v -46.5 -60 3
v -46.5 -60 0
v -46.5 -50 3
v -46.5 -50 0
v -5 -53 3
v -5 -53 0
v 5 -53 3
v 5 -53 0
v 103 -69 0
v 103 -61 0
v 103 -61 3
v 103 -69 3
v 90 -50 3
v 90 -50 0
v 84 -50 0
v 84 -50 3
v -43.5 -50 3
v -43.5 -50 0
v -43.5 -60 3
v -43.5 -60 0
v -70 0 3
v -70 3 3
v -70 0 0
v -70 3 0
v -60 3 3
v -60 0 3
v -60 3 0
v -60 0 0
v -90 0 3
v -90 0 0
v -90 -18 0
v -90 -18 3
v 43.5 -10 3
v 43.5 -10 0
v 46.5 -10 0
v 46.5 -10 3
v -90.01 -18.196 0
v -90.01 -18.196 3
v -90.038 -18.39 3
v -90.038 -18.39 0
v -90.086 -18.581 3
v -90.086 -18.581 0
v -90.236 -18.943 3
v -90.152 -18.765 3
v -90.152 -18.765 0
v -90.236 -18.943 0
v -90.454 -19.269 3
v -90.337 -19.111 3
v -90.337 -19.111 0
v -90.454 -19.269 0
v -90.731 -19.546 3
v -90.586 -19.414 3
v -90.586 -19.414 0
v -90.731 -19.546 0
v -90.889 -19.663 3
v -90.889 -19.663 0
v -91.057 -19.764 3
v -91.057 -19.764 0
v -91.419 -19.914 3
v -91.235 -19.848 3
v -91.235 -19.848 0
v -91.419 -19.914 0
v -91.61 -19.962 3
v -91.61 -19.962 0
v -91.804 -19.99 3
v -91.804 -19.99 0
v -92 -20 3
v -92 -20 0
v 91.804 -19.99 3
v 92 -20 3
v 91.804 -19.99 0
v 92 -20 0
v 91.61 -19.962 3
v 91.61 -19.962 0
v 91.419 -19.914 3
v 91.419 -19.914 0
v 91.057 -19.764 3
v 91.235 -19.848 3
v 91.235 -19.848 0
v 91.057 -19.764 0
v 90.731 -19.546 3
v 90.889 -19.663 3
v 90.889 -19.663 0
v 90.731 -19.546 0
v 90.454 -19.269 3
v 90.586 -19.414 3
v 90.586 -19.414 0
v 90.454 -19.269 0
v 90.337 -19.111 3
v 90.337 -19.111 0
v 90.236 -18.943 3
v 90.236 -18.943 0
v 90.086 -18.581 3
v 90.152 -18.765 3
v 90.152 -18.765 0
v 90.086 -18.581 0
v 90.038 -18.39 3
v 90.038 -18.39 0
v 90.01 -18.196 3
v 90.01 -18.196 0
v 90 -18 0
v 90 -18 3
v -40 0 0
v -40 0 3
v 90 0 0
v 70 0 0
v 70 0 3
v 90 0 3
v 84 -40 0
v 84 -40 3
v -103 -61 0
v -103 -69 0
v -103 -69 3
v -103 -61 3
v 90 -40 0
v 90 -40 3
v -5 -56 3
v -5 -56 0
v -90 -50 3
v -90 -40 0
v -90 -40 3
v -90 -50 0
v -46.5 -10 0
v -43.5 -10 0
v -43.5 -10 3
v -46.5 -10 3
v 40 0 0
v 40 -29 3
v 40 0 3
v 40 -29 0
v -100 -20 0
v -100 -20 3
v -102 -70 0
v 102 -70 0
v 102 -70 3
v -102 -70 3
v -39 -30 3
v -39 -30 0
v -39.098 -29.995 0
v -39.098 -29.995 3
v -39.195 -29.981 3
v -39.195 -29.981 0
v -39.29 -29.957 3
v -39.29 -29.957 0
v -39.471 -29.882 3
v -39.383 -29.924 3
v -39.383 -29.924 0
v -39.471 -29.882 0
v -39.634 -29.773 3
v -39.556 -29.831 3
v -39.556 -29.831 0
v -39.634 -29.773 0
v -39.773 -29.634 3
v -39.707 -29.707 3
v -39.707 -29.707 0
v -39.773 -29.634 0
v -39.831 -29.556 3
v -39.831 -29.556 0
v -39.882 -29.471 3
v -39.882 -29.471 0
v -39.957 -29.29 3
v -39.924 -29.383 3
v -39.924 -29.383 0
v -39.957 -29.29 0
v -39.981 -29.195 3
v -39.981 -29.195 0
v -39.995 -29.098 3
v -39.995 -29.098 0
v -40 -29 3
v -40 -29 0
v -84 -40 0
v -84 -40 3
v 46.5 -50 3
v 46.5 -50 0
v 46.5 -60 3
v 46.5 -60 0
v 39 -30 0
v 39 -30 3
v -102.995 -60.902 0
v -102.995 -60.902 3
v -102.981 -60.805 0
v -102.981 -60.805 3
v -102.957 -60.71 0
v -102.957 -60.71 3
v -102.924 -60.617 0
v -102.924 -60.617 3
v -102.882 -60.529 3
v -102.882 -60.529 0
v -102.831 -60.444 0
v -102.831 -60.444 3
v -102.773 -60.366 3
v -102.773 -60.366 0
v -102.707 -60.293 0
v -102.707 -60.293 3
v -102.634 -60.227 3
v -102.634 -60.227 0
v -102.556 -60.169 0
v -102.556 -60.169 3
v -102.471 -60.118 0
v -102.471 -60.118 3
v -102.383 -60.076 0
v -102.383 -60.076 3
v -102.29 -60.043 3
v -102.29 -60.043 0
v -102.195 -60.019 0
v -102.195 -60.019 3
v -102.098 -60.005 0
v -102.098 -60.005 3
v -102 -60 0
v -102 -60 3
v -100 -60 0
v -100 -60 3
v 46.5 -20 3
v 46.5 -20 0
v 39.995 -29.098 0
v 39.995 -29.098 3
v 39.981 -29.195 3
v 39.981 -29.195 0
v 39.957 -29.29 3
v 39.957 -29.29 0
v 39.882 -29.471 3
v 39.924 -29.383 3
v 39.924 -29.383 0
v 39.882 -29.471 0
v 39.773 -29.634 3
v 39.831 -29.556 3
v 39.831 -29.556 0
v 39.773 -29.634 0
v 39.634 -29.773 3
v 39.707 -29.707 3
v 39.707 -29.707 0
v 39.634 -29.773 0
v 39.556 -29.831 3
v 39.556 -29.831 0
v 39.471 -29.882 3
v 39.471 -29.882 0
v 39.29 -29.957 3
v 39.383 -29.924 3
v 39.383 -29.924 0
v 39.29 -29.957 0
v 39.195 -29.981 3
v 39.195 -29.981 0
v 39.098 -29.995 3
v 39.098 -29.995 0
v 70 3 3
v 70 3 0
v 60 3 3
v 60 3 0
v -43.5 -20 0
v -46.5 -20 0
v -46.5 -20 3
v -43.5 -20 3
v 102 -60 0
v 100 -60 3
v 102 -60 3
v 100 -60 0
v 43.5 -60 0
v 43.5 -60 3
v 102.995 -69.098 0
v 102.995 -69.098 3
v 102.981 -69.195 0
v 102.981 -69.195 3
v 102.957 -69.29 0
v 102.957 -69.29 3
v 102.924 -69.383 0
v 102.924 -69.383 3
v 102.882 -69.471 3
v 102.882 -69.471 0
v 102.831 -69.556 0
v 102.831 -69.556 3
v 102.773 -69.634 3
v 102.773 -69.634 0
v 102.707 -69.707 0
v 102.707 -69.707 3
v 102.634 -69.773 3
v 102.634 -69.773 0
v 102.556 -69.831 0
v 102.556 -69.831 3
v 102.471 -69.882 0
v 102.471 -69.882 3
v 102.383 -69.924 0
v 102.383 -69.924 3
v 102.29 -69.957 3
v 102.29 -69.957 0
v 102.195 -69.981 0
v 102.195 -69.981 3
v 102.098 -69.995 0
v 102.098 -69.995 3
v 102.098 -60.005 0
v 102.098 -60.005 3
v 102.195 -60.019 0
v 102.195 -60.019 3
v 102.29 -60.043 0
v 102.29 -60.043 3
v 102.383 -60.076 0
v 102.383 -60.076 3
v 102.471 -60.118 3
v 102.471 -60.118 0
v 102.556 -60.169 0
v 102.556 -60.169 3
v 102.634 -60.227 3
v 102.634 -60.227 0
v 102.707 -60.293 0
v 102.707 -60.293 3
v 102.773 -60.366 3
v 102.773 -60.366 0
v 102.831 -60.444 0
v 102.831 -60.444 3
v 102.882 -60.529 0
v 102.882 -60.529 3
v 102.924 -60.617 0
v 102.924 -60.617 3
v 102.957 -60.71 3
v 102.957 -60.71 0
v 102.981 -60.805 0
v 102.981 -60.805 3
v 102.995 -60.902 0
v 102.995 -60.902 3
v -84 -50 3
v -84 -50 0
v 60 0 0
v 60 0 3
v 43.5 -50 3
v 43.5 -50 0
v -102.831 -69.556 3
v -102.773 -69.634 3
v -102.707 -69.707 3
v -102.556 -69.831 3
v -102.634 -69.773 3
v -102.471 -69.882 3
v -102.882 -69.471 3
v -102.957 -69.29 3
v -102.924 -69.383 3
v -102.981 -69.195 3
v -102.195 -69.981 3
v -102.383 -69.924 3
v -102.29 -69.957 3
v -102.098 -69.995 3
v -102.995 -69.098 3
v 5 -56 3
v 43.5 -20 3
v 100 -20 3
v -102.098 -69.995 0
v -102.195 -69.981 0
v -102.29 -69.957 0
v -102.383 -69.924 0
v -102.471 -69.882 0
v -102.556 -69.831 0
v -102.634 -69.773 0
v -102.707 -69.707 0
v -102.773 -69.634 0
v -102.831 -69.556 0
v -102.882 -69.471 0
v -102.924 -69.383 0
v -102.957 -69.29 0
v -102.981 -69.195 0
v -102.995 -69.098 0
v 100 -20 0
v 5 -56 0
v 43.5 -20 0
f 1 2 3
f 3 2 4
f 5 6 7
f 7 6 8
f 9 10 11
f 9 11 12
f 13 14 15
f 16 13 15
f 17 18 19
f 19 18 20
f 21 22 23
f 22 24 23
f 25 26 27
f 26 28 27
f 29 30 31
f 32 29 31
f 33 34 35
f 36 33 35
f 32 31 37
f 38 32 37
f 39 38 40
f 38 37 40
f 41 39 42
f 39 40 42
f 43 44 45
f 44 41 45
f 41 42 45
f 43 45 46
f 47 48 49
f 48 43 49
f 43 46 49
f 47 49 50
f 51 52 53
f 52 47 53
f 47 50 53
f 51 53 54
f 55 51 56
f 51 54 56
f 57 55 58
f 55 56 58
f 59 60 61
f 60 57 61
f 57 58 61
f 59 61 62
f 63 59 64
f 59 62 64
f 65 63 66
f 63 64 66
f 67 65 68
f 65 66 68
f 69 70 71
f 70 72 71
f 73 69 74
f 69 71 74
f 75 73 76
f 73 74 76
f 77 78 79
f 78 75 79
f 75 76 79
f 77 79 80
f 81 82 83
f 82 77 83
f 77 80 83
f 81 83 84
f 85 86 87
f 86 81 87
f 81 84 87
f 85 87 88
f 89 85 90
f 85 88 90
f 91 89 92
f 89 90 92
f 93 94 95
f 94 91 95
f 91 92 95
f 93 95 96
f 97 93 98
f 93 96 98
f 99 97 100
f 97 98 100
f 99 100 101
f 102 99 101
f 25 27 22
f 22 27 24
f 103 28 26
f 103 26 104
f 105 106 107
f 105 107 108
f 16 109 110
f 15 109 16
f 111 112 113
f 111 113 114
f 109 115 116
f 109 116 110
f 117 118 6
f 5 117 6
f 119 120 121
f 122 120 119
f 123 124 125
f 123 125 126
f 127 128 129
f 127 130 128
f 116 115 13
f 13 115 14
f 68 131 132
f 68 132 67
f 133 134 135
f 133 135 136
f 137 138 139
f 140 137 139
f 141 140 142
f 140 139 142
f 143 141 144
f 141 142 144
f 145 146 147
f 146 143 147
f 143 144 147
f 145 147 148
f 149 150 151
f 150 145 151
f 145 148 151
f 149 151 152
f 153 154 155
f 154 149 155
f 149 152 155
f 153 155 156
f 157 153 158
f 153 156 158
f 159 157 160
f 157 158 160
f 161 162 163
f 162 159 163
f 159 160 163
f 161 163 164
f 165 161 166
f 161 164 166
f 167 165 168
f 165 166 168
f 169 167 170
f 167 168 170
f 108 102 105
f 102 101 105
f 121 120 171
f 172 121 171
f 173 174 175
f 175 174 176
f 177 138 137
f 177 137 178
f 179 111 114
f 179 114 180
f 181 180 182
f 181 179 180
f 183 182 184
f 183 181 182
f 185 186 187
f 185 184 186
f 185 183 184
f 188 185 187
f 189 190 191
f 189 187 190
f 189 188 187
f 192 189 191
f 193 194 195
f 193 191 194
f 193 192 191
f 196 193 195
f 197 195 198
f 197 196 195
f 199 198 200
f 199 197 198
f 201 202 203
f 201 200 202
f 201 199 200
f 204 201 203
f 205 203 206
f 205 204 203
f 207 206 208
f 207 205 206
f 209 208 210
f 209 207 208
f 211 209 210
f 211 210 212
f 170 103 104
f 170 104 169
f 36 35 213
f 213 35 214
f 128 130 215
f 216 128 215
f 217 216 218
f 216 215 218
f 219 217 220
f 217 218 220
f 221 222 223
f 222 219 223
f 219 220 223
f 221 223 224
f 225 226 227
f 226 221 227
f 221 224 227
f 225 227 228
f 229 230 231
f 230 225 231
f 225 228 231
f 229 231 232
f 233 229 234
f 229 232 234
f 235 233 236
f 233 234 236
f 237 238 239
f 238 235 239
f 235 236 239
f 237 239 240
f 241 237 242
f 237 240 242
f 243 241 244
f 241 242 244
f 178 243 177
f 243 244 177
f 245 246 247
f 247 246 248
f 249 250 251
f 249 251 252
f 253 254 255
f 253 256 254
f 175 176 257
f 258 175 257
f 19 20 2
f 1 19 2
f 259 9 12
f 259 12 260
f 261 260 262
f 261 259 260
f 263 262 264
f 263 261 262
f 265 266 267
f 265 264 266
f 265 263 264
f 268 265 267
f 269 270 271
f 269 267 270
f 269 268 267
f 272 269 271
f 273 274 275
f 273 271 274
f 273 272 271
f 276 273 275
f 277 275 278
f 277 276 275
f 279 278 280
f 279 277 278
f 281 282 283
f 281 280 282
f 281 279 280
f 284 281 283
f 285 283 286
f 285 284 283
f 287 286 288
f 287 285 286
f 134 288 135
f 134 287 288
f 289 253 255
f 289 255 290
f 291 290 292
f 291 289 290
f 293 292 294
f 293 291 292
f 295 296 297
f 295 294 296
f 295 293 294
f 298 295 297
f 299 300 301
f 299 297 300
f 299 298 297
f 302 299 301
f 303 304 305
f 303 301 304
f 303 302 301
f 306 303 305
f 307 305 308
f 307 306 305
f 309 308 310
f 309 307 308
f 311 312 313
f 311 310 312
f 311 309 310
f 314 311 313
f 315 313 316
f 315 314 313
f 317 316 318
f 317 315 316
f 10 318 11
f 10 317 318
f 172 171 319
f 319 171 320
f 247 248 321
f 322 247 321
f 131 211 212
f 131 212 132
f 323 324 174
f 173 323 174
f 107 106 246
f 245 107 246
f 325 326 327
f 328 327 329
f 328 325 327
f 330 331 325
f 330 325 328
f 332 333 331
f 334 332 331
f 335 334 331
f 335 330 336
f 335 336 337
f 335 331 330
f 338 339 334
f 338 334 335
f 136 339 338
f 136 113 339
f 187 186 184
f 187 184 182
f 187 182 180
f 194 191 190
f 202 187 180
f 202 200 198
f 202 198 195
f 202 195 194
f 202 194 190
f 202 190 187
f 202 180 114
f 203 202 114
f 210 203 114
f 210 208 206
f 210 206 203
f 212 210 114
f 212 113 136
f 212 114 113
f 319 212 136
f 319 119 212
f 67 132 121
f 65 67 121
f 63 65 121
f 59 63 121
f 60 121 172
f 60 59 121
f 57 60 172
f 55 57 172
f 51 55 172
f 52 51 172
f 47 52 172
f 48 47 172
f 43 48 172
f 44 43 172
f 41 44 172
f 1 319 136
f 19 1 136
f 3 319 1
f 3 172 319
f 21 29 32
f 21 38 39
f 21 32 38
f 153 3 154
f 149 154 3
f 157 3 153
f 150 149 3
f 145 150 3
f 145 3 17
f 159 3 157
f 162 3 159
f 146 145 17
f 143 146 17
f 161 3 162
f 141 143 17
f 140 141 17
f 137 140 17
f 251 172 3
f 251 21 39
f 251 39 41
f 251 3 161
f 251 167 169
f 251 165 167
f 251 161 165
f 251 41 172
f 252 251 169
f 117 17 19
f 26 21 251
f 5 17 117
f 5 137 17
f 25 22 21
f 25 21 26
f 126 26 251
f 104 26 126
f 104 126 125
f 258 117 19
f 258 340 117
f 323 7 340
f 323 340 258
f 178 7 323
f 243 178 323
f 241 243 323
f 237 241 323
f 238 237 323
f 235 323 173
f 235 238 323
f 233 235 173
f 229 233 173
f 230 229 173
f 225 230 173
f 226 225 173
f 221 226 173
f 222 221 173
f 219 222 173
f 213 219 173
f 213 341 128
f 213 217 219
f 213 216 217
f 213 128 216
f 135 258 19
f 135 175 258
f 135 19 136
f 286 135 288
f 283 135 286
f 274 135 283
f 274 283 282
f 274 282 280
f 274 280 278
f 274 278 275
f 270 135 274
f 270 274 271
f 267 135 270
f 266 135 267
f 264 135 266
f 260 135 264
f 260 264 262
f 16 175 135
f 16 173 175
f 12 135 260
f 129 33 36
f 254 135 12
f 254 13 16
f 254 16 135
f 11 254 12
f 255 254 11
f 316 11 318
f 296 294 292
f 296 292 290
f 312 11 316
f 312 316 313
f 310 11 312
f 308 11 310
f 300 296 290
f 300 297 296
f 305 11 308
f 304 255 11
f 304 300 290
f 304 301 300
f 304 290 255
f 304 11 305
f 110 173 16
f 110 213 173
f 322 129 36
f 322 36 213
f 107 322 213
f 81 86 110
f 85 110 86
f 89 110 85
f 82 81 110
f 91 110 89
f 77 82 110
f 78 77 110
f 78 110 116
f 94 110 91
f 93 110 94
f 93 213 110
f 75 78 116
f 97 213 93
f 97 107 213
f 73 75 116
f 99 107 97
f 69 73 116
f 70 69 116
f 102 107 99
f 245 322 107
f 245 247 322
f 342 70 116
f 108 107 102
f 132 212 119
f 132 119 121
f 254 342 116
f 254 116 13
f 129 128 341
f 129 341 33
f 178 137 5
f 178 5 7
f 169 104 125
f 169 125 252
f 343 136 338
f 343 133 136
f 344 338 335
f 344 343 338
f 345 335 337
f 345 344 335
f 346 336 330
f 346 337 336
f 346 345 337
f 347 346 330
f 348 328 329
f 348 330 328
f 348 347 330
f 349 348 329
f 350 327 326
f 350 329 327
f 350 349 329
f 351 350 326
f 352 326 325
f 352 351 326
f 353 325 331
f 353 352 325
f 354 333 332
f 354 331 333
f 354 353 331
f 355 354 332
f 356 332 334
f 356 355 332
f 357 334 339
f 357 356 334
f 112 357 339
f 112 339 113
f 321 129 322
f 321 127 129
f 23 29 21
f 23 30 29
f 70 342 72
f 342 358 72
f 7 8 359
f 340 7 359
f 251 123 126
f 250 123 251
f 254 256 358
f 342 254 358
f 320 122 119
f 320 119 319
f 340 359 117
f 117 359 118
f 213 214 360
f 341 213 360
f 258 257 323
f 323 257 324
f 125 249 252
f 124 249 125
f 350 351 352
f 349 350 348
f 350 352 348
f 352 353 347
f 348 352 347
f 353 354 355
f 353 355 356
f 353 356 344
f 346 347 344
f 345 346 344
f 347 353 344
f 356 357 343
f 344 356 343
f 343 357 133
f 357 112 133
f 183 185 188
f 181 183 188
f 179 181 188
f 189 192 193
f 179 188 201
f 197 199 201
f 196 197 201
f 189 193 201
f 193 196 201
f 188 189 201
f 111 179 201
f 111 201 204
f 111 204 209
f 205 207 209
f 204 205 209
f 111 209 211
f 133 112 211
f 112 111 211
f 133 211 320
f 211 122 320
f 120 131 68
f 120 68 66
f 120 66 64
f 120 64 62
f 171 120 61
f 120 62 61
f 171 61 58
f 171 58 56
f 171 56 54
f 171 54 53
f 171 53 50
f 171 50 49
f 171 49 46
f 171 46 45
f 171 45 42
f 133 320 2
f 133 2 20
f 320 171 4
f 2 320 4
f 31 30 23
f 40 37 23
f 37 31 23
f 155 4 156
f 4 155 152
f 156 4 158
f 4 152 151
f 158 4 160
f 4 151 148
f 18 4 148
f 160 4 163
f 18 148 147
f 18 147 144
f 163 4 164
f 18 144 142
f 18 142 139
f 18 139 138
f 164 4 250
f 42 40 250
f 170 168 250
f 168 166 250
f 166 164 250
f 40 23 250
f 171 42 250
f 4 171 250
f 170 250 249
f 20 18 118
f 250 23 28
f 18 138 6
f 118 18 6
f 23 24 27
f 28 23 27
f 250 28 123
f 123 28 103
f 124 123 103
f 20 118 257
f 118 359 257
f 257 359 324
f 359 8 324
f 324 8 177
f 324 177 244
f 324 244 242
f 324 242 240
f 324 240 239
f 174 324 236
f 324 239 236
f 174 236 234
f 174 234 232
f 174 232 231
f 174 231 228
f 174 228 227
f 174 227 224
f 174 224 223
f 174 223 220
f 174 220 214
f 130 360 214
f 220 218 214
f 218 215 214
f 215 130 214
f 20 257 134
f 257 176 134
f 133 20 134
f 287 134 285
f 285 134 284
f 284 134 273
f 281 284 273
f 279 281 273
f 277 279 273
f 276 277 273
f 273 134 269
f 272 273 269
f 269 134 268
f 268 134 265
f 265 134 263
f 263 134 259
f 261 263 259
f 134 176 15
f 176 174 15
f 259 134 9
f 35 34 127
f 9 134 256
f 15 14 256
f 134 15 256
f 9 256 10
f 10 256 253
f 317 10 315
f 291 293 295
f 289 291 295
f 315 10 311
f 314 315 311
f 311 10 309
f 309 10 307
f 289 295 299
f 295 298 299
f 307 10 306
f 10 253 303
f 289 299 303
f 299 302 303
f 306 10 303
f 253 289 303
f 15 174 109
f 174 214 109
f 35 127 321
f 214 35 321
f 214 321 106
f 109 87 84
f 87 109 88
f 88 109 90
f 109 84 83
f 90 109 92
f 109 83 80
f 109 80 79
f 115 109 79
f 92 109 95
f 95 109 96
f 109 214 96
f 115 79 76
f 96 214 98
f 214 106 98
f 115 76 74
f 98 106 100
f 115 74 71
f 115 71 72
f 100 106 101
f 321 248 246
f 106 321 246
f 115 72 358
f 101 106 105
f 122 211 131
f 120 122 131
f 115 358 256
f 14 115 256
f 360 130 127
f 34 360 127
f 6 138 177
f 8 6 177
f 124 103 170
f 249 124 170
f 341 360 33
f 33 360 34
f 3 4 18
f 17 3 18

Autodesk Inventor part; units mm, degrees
ref_plane "YZ Plane" through (0, 0, 0) normal (1, 0, 0) x (0, 1, 0)
ref_plane "XZ Plane" through (0, 0, 0) normal (0, 1, 0) x (-1, 0, 0)
ref_plane "XY Plane" through (0, 0, 0) normal (0, 0, 1) x (1, 0, 0)
sketch "Sketch1" plane through (0, 0, 0) normal (0, 0, 1) x (1, 0, 0)
  line L0 (-40, 0) -> (-40, -29)
  line L1 (-39, -30) -> (39, -30)
  line L2 (40, -29) -> (40, 0)
  line L3 (100, -60) -> (102, -60)
  line L4 (103, -61) -> (103, -69)
  line L5 (102, -70) -> (-102, -70)
  line L6 (-103, -69) -> (-103, -61)
  line L7 (-102, -60) -> (-100, -60)
  line L8 (-60, 0) -> (-60, 3)
  line L9 (-60, 3) -> (-70, 3)
  line L10 (-70, 3) -> (-70, 0)
  line L11 (-90, 0) -> (-70, 0)
  line L12 (-60, 0) -> (-40, 0)
  line L13 (70, 0) -> (70, 3)
  line L14 (70, 3) -> (60, 3)
  line L15 (60, 3) -> (60, 0)
  line L16 (40, 0) -> (60, 0)
  line L17 (70, 0) -> (90, 0)
  arc A0 (-103, -69) -> (-102, -70) centre (-102, -69) ccw
  arc A1 (102, -70) -> (103, -69) centre (102, -69) ccw
  arc A2 (39, -30) -> (40, -29) centre (39, -29) ccw
  arc A3 (-40, -29) -> (-39, -30) centre (-39, -29) ccw
  line L18 (-90, -40) -> (-84, -40)
  line L19 (-84, -40) -> (-84, -50)
  line L20 (90, -40) -> (84, -40)
  line L21 (84, -40) -> (84, -50)
  line L22 (-43.5, -10) -> (-46.5, -10)
  line L23 (-46.5, -10) -> (-46.5, -20)
  line L24 (-46.5, -20) -> (-43.5, -20)
  line L25 (-43.5, -20) -> (-43.5, -10)
  line L26 (43.5, -10) -> (46.5, -10)
  line L27 (46.5, -10) -> (46.5, -20)
  line L28 (46.5, -20) -> (43.5, -20)
  line L29 (43.5, -20) -> (43.5, -10)
  line L30 (-46.5, -50) -> (-43.5, -50)
  line L31 (-43.5, -50) -> (-43.5, -60)
  line L32 (-43.5, -60) -> (-46.5, -60)
  line L33 (-46.5, -60) -> (-46.5, -50)
  line L34 (43.5, -50) -> (46.5, -50)
  line L35 (46.5, -50) -> (46.5, -60)
  line L36 (46.5, -60) -> (43.5, -60)
  line L37 (43.5, -60) -> (43.5, -50)
  line L38 (-5, -53) -> (5, -53)
  line L39 (5, -53) -> (5, -56)
  line L40 (5, -56) -> (-5, -56)
  line L41 (-5, -56) -> (-5, -53)
  line L42 (-100, -60) -> (-100, -20)
  line L43 (-100, -20) -> (-92, -20)
  line L44 (-90, -40) -> (-90, -50)
  line L45 (90, -40) -> (90, -50)
  line L46 (90, -50) -> (84, -50)
  line L47 (100, -60) -> (100, -20)
  line L48 (100, -20) -> (92, -20)
  line L49 (90, -18) -> (90, 0)
  line L50 (-90, 0) -> (-90, -18)
  arc A4 (-92, -20) -> (-90, -18) centre (-92, -18) ccw
  arc A5 (90, -18) -> (92, -20) centre (92, -18) ccw
  line L51 (-90, -50) -> (-84, -50)
  arc A6 (-102, -60) -> (-103, -61) centre (-102, -61) ccw
  arc A7 (103, -61) -> (102, -60) centre (102, -61) ccw
  point P0 (0, 0)
  point P1 (-40, -30)
  point P2 (40, -30)
  point P3 (103, -60)
  point P4 (103, -70)
  point P5 (-103, -70)
  point P6 (-103, -60)
  point P7 (-90, -20)
  point P8 (90, -20)
  dimension "d0" = 80
  dimension "d1" = 30
  dimension "d2" = 50
  dimension "d5" = 10
  dimension "d7" = 10
  dimension "d10" = 50
  dimension "d13" = 3
  dimension "d14" = 3
  dimension "d15" = 3
  dimension "d16" = 10
  dimension "d18" = 10
  dimension "d20" = 3
  dimension "d21" = 40
  dimension "d22" = 206
  dimension "d23" = 30
  dimension "d24" = 40
  dimension "d27" = 1
  dimension "d28" = 10
  dimension "d29" = 6
  dimension "d31" = 40
  dimension "d32" = 10
  dimension "d33" = 6
  dimension "d35" = 40
  dimension "d39" = 10
  dimension "d40" = 3
  dimension "d41" = 10
  dimension "d42" = 3
  dimension "d44" = 10
  dimension "d45" = 10
  dimension "d50" = 3
  dimension "d51" = 10
  dimension "d52" = 10
  dimension "d54" = 3
  dimension "d55" = 10
  dimension "d56" = 10
  dimension "d60" = 10
  dimension "d61" = 3
  dimension "d62" = 17
  dimension "d66" = 40
  dimension "d67" = 40
  dimension "d71" = 3.5
  dimension "d72" = 3.5
  dimension "d73" = 3.5
  dimension "d74" = 3.5
  dimension "d77" = 20
  dimension "d78" = 20
  dimension "d79" = 10
  dimension "d80" = 10
  dimension "d81" = 2
  dimension "d82" = 10
  dimension "d84" = 50
  dimension "d85" = 20
  dimension "d86" = 20
  dimension "d87" = 60
  dimension "d88" = 5
  dimension "d91" = 1
extrude "Extrusion7" add sketch "Sketch1" along normal blind 3
properties part number "OpenROV 2_3 Dev Bulkhead"
